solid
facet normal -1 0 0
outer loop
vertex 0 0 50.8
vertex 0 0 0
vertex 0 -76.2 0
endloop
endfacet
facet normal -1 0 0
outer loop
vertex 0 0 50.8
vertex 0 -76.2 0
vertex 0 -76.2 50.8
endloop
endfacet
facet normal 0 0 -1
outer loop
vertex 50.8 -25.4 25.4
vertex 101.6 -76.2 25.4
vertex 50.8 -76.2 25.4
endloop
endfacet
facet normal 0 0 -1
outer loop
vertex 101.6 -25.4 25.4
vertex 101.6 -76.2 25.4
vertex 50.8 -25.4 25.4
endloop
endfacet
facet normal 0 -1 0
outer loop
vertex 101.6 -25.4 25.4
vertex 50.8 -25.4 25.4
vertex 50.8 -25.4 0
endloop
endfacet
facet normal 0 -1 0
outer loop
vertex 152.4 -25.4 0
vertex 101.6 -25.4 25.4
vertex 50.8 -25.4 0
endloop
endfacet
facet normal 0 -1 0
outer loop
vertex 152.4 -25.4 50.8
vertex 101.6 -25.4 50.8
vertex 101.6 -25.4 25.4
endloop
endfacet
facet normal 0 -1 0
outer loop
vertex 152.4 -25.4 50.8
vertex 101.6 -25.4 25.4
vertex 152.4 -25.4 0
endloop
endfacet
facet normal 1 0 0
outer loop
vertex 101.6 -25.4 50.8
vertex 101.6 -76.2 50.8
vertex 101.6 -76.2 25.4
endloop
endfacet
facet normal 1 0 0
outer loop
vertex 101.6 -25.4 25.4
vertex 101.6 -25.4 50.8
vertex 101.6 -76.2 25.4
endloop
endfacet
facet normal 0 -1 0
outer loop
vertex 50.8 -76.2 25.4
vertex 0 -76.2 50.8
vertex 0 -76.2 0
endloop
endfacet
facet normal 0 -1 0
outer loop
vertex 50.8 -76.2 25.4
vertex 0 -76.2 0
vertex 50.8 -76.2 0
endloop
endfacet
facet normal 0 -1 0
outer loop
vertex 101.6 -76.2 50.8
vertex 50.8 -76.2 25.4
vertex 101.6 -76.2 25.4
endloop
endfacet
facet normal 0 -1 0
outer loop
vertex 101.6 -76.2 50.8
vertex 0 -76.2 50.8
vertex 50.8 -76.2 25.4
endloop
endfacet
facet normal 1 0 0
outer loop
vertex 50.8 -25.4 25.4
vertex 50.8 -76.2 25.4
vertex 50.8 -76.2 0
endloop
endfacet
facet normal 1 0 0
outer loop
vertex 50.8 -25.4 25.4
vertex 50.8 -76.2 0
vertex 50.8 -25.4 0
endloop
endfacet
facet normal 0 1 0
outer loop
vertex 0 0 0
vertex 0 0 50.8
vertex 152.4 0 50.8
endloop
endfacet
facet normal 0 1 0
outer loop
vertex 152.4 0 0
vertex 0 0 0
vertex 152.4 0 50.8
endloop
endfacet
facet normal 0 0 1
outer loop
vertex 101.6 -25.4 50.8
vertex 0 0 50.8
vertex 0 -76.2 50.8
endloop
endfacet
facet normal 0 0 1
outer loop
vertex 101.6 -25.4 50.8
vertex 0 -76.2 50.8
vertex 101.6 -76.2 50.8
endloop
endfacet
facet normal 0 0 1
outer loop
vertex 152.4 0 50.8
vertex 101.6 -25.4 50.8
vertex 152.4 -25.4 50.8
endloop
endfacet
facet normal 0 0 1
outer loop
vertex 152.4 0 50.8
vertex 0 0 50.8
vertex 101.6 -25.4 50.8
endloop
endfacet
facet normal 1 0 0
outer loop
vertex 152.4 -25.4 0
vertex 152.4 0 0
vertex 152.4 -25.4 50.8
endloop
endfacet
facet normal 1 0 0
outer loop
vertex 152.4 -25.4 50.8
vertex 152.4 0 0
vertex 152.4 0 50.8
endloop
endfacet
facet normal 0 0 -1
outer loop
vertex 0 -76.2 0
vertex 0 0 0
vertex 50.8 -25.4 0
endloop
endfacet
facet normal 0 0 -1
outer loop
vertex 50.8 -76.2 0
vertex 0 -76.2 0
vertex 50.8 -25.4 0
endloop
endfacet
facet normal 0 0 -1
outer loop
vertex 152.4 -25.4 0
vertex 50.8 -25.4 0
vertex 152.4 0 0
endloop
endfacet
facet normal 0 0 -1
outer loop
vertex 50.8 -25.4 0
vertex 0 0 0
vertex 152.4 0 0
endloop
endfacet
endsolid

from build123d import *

# Parameters (mm, degrees)
F0_W     = 152.4
F0_H     = 50.8
F1_DEPTH = 76.2
F2_W     = 50.8
F2_H     = 25.4
F3_DEPTH = 50.8
F4_W     = 50.8
F4_H     = 25.4
F5_DEPTH = 50.8


with BuildPart() as f1:
    # F0 (on Front) → F1 (new body)
    with BuildSketch(Plane.XZ):
        with Locations((76.2, 25.4)):
            Rectangle(F0_W, F0_H)
    extrude(amount=F1_DEPTH)

    # F2 (on face) → F3 (cut)
    with BuildSketch(Plane.XZ.offset(76.2)):
        with Locations((127, 12.7)):
            Rectangle(F2_W, F2_H)
        with Locations((127, 38.1)):
            Rectangle(F2_W, F2_H)
    extrude(amount=-F3_DEPTH, mode=Mode.SUBTRACT)

    # F4 (on face) → F5 (cut)
    with BuildSketch(Plane.YZ.offset(101.6)):
        with Locations((-50.8, 12.7)):
            Rectangle(F4_W, F4_H)
    extrude(amount=-F5_DEPTH, mode=Mode.SUBTRACT)


solid = f1.part
